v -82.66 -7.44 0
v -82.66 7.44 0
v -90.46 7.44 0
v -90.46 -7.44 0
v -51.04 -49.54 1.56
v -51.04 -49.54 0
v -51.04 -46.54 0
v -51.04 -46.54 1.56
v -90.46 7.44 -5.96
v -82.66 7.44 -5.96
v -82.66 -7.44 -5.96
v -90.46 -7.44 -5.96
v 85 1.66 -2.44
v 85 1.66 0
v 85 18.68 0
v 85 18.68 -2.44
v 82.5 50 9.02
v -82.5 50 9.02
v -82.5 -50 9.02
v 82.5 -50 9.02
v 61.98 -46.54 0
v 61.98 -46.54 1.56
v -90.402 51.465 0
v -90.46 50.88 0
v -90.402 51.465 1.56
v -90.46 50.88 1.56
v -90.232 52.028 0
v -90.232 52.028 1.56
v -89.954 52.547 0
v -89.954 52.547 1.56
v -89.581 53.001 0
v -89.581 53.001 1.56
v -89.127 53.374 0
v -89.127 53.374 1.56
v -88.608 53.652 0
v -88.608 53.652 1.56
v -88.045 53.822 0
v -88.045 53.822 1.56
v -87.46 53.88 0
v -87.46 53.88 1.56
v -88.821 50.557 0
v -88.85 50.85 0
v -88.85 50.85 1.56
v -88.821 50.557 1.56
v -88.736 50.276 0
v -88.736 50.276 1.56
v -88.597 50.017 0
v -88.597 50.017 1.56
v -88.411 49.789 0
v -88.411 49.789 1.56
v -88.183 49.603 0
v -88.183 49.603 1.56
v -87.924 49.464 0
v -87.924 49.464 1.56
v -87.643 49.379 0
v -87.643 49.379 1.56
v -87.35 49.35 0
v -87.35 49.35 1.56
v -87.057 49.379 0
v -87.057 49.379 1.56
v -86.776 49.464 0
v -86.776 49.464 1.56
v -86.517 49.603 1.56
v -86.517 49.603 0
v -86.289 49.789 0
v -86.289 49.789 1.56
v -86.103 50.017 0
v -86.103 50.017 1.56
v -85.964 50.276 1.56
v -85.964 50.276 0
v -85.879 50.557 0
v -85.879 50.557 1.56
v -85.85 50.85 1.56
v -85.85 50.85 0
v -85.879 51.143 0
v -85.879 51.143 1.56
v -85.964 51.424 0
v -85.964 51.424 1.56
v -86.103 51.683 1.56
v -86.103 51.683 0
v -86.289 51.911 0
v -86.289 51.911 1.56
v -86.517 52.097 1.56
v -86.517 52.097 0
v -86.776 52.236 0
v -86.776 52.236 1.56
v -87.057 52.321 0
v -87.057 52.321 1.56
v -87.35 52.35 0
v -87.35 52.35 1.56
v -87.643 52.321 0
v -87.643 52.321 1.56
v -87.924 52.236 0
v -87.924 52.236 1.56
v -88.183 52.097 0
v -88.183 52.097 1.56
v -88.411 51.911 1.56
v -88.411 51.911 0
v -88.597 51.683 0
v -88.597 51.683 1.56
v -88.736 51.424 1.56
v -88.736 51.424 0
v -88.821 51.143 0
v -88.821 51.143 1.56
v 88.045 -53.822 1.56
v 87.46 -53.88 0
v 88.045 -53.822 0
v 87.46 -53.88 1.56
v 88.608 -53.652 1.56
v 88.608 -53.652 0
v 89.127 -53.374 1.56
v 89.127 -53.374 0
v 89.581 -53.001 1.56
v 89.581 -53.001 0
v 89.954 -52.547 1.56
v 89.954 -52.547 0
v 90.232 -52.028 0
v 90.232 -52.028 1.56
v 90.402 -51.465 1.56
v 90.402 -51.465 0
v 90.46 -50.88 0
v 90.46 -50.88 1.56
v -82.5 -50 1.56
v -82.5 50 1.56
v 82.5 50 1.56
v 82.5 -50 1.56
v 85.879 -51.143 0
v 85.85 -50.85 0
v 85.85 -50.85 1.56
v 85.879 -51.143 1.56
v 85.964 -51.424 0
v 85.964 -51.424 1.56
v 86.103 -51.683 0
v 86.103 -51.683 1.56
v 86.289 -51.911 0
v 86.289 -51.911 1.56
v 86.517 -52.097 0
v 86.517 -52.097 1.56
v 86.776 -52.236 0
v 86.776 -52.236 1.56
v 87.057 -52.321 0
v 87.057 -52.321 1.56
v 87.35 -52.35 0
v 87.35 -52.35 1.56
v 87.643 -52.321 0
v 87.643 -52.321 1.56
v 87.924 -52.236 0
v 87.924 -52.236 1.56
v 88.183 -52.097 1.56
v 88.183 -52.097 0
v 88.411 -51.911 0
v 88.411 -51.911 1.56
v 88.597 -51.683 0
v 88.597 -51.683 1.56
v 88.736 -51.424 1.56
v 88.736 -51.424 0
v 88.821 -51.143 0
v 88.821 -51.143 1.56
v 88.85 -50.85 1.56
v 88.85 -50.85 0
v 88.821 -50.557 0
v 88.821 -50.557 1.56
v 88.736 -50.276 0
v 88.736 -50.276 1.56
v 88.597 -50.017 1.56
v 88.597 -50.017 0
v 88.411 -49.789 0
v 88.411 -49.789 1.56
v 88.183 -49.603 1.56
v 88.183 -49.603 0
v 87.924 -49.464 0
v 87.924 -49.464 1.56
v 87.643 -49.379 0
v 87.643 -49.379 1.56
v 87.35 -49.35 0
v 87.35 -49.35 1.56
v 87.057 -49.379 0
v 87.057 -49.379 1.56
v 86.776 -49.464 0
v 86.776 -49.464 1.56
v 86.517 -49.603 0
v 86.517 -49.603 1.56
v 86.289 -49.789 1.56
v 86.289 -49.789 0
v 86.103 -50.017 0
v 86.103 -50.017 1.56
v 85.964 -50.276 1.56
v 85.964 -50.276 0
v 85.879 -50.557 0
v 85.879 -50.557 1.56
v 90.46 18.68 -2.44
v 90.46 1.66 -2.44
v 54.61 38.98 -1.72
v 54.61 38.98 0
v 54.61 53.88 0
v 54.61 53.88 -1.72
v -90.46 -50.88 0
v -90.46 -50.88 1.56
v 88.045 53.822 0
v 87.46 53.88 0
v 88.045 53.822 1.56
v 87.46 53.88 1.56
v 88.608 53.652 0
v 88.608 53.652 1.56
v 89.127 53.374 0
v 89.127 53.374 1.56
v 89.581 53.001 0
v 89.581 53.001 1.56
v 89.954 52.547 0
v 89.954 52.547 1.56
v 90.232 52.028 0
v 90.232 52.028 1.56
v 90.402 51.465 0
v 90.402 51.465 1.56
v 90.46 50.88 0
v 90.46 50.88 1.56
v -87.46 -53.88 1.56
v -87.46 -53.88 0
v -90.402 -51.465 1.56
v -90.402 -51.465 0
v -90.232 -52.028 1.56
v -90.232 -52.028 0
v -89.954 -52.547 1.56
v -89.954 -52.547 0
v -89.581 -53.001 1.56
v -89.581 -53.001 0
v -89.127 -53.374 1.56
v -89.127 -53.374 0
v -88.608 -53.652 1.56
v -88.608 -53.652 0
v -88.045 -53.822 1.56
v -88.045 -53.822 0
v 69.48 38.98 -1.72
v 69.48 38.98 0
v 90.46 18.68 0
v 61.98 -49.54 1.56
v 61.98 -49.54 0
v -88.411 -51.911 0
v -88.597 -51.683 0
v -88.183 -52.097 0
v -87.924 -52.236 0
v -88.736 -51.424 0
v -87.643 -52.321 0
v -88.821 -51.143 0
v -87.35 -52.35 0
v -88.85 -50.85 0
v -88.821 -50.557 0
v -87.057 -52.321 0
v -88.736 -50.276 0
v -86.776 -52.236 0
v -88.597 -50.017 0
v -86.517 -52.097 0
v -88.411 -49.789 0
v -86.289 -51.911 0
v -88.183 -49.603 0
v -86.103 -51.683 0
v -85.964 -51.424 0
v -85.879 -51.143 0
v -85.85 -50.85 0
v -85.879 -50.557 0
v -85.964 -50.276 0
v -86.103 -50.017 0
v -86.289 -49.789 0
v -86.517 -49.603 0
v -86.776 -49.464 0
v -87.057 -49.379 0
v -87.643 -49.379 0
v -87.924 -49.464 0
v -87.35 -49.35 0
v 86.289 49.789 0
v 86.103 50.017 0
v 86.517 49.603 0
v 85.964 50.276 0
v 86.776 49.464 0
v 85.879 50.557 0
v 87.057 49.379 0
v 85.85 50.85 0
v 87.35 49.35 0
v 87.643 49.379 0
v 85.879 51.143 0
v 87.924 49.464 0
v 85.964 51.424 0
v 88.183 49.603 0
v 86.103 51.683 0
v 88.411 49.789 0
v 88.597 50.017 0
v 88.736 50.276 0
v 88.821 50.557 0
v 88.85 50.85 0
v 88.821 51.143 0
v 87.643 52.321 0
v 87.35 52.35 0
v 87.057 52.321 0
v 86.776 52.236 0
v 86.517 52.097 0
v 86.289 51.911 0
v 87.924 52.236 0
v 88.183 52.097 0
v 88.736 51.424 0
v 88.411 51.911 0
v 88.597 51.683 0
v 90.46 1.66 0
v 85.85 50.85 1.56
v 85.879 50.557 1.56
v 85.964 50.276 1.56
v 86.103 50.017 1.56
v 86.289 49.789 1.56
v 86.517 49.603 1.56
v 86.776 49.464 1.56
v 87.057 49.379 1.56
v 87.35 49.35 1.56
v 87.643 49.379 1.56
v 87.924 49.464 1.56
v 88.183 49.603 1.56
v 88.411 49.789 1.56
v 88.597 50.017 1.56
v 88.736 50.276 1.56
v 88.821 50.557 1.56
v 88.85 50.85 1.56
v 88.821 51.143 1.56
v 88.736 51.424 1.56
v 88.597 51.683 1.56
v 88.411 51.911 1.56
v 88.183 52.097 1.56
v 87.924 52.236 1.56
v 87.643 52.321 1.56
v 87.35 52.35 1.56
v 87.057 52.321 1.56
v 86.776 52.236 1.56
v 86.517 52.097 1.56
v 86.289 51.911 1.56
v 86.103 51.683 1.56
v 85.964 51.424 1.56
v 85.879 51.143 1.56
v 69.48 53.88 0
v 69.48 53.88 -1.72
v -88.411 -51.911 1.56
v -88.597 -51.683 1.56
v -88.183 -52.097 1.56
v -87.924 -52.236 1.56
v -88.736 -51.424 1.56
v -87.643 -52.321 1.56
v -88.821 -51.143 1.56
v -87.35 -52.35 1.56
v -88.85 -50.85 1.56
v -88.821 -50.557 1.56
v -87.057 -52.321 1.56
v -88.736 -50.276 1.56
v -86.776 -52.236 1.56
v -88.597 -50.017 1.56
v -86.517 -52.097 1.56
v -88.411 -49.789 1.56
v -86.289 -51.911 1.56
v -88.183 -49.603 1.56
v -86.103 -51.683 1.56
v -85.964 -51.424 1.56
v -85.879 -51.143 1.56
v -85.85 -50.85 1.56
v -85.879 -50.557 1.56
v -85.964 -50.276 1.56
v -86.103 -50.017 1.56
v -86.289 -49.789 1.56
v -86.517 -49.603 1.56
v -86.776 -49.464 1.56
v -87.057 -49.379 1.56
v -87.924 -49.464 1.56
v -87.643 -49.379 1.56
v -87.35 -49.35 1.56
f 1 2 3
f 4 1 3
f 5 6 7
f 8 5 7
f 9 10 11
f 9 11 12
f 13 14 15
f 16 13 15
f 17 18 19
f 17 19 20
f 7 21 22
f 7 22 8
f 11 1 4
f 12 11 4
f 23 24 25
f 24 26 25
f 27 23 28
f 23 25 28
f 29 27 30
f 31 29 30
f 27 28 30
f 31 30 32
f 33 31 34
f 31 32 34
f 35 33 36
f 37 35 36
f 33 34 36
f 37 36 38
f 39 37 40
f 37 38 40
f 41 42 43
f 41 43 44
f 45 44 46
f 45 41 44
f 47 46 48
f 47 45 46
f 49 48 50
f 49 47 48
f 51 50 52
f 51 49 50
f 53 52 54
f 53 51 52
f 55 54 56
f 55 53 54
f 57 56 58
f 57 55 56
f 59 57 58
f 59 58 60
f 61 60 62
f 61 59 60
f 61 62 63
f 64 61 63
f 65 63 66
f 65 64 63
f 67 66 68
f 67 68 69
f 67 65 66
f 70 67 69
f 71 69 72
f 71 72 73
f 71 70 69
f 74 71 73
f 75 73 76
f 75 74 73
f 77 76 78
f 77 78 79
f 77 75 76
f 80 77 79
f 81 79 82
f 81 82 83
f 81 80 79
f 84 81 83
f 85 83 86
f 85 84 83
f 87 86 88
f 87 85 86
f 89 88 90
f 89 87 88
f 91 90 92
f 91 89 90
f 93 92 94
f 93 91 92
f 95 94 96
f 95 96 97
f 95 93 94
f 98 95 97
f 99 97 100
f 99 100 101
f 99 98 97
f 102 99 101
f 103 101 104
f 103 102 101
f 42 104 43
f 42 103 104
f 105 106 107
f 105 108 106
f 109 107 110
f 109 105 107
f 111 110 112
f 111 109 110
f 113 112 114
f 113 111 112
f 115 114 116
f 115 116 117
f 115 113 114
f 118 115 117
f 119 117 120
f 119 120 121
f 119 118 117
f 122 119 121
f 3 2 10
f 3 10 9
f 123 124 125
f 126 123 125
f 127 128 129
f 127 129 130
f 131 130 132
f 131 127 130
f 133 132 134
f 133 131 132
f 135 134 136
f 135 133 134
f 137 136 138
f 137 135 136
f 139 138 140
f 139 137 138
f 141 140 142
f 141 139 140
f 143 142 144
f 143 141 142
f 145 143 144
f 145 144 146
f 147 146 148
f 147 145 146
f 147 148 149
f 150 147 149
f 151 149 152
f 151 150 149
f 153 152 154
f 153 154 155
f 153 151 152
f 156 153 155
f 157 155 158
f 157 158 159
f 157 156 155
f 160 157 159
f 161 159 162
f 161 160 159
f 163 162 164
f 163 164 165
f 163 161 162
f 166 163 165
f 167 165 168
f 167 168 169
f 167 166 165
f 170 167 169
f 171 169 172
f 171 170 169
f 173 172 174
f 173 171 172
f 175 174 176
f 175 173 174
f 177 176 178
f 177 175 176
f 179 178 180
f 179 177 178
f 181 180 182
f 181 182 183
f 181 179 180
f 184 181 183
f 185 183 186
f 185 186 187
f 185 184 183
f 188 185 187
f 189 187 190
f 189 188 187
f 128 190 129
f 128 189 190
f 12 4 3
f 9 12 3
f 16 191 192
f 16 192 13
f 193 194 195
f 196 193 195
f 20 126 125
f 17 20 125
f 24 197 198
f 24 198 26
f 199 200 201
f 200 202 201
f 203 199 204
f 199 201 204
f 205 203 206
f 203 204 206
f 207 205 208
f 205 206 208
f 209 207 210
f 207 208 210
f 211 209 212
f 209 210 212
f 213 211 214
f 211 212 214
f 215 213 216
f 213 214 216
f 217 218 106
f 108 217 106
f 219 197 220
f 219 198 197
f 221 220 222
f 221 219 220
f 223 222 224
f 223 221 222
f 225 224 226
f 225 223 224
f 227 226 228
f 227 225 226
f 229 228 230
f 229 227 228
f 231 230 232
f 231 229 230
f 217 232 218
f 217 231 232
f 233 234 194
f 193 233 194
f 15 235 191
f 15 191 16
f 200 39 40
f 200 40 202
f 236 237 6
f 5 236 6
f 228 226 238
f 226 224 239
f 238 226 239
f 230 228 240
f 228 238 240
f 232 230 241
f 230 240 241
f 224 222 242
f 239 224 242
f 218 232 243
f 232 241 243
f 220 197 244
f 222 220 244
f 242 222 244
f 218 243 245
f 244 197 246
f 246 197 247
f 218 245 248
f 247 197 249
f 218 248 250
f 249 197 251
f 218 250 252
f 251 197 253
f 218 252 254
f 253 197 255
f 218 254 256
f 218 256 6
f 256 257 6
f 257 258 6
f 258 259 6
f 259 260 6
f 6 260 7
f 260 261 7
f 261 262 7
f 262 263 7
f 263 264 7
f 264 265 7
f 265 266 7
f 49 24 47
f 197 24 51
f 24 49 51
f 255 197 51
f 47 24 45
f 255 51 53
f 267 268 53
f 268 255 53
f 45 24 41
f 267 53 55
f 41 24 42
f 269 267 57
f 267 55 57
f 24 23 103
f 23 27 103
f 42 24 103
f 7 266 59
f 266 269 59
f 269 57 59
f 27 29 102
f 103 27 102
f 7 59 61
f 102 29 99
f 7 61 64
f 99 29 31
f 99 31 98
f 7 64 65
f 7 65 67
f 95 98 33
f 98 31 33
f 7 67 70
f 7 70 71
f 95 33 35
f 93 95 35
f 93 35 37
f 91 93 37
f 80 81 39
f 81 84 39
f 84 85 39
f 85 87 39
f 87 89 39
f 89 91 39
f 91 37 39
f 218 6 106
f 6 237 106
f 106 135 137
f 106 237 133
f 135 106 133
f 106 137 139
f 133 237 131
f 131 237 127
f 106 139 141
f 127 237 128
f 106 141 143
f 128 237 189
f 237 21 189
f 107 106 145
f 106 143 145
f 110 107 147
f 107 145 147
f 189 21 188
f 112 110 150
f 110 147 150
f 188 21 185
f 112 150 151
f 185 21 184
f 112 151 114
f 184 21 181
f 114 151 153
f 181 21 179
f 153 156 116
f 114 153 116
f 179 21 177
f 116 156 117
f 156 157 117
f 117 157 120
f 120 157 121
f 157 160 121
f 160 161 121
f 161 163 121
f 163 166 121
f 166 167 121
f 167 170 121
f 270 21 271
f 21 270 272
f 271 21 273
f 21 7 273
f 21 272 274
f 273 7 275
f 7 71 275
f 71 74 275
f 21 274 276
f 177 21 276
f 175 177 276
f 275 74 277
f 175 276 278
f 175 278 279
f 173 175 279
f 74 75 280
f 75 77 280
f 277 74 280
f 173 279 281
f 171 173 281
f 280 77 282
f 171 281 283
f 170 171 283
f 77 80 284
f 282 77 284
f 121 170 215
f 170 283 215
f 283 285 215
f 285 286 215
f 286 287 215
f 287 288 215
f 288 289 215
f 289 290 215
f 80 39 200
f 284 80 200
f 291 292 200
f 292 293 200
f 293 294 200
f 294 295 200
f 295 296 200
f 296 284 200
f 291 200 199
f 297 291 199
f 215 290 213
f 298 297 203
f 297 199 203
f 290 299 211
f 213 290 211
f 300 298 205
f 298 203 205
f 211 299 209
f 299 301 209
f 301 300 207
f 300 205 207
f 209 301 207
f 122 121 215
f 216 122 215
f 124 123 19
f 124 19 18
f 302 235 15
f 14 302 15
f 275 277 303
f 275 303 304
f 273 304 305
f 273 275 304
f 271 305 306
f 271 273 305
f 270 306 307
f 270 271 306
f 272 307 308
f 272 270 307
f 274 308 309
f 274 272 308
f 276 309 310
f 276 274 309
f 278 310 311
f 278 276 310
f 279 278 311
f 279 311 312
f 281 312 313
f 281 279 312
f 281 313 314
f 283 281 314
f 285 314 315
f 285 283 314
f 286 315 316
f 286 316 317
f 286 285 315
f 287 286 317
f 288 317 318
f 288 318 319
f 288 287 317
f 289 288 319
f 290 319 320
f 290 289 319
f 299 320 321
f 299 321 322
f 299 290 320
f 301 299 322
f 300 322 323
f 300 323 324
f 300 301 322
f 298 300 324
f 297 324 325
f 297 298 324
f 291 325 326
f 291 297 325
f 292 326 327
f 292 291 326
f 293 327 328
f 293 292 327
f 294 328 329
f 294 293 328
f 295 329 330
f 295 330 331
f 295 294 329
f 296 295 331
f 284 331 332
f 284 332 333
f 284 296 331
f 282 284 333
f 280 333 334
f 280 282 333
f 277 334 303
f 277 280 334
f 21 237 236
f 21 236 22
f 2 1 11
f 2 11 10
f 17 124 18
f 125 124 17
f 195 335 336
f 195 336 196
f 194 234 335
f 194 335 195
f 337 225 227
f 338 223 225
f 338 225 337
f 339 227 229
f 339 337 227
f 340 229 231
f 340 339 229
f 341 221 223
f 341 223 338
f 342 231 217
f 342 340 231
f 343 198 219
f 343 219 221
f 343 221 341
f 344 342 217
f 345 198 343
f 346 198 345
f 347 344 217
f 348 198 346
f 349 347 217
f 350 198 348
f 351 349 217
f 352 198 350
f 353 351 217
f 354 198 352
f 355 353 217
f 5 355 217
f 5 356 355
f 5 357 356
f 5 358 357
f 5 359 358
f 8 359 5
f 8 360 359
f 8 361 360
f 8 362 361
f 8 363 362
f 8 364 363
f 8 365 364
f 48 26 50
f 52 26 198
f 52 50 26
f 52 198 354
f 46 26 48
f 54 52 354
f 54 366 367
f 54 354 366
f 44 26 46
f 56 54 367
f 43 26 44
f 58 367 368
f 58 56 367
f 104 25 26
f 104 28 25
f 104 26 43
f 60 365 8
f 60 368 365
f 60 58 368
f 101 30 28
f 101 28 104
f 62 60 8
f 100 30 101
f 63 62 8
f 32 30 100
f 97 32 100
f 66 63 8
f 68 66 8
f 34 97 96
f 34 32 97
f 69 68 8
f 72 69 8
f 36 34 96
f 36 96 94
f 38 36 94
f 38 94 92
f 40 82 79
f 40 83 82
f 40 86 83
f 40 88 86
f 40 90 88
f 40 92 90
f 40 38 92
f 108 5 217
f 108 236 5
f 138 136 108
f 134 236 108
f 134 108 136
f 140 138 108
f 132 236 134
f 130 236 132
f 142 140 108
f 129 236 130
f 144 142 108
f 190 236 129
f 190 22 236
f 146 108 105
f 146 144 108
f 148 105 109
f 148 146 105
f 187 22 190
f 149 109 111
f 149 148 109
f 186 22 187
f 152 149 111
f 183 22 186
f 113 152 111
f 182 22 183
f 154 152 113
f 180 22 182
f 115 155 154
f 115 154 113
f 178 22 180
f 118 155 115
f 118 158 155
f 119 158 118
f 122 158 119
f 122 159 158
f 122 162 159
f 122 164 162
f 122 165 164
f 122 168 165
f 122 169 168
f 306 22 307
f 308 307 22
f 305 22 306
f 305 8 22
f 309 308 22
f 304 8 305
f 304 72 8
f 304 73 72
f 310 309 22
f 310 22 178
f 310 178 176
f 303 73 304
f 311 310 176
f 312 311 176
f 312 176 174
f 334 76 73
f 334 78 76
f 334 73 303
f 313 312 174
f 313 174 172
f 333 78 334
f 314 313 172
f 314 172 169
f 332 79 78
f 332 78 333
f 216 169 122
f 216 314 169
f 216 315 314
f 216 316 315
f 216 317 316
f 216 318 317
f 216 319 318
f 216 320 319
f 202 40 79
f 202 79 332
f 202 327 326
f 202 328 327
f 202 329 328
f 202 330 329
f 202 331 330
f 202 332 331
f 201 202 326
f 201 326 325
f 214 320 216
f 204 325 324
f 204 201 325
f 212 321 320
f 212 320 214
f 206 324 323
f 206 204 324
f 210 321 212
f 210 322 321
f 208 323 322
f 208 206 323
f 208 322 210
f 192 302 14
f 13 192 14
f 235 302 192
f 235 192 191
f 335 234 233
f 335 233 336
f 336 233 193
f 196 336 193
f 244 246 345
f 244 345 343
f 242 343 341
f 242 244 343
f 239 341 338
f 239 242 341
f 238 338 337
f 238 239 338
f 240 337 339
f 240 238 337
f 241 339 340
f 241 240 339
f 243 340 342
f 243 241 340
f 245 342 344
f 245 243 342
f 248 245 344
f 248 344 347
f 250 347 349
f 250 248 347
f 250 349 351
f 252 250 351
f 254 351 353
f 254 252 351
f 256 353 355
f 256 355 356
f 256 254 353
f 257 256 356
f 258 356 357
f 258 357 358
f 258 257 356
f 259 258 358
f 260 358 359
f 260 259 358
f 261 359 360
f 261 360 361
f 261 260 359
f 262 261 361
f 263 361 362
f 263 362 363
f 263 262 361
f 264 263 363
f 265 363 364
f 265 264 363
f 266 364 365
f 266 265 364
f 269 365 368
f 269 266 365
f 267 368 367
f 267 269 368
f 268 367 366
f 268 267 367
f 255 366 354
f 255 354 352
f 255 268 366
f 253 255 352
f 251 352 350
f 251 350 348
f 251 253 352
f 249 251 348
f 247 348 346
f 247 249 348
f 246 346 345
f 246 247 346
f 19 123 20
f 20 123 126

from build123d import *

# Parameters (mm, degrees)
SKETCH1_W           = 180.92
SKETCH1_H           = 107.76
SKETCH1_R           = 1.5
BOSS_EXTRUDE1_DEPTH = 1.56
SKETCH2_W           = 165
SKETCH2_H           = 100
BOSS_EXTRUDE2_DEPTH = 7.46
SKETCH3_W           = 7.8
SKETCH3_H           = 14.88
BOSS_EXTRUDE3_DEPTH = 5.96
SKETCH4_W           = 14.87
SKETCH4_H           = 14.9
BOSS_EXTRUDE4_DEPTH = 1.72
SKETCH5_W           = 5.46
SKETCH5_H           = 17.02
BOSS_EXTRUDE5_DEPTH = 2.44
SKETCH6_W           = 113.02
SKETCH6_H           = 3
CUT_EXTRUDE1_DEPTH  = 1.56
FILLET1_R           = 3


with BuildPart() as part:
    # Sketch1 → Boss-Extrude1 (new body)
    with BuildSketch(Plane.XY):
        Rectangle(SKETCH1_W, SKETCH1_H)
        with Locations(Location((87.35, 50.85, 0), (0, 0, 180))):
            Circle(SKETCH1_R, mode=Mode.SUBTRACT)
        with Locations(Location((87.35, -50.85, 0), (0, 0, 180))):
            Circle(SKETCH1_R, mode=Mode.SUBTRACT)
        with Locations(Location((-87.35, 50.85, 0), (0, 0, 180))):
            Circle(SKETCH1_R, mode=Mode.SUBTRACT)
        with Locations(Location((-87.35, -50.85, 0), (0, 0, 180))):
            Circle(SKETCH1_R, mode=Mode.SUBTRACT)
    extrude(amount=BOSS_EXTRUDE1_DEPTH)

    # Sketch6 → Cut-Extrude1 (cut)
    with BuildSketch(Plane(origin=(0, 0, 0), x_dir=(-1, 0, 0), z_dir=(0, 0, -1))):
        with Locations((-5.47, -48.04)):
            Rectangle(SKETCH6_W, SKETCH6_H)
    extrude(amount=-CUT_EXTRUDE1_DEPTH, mode=Mode.SUBTRACT)

    # Fillet1
    fillet1_edges = [part.edges().sort_by_distance(p)[0] for p in [
        (90.46, -53.88, 0.78),
        (-90.46, -53.88, 0.78),
        (-90.46, 53.88, 0.78),
        (90.46, 53.88, 0.78),
    ]]
    fillet(fillet1_edges, radius=FILLET1_R)


with BuildPart() as body_2:
    # Sketch2 → Boss-Extrude2 (new body)
    with BuildSketch(Plane.XY.offset(1.56)):
        Rectangle(SKETCH2_W, SKETCH2_H)
    extrude(amount=BOSS_EXTRUDE2_DEPTH)


with BuildPart() as body_3:
    # Sketch3 → Boss-Extrude3 (new body)
    with BuildSketch(Plane(origin=(0, 0, 0), x_dir=(-1, 0, 0), z_dir=(0, 0, -1))):
        with Locations((86.56, 0)):
            Rectangle(SKETCH3_W, SKETCH3_H)
    extrude(amount=BOSS_EXTRUDE3_DEPTH)


with BuildPart() as body_4:
    # Sketch4 → Boss-Extrude4 (new body)
    with BuildSketch(Plane(origin=(0, 0, 0), x_dir=(-1, 0, 0), z_dir=(0, 0, -1))):
        with Locations((-62.045, 46.43)):
            Rectangle(SKETCH4_W, SKETCH4_H)
    extrude(amount=BOSS_EXTRUDE4_DEPTH)


with BuildPart() as body_5:
    # Sketch5 → Boss-Extrude5 (new body)
    with BuildSketch(Plane(origin=(0, 0, 0), x_dir=(-1, 0, 0), z_dir=(0, 0, -1))):
        with Locations((-87.73, 10.17)):
            Rectangle(SKETCH5_W, SKETCH5_H)
    extrude(amount=BOSS_EXTRUDE5_DEPTH)


solid = Compound([part.part, body_2.part, body_3.part, body_4.part, body_5.part])
